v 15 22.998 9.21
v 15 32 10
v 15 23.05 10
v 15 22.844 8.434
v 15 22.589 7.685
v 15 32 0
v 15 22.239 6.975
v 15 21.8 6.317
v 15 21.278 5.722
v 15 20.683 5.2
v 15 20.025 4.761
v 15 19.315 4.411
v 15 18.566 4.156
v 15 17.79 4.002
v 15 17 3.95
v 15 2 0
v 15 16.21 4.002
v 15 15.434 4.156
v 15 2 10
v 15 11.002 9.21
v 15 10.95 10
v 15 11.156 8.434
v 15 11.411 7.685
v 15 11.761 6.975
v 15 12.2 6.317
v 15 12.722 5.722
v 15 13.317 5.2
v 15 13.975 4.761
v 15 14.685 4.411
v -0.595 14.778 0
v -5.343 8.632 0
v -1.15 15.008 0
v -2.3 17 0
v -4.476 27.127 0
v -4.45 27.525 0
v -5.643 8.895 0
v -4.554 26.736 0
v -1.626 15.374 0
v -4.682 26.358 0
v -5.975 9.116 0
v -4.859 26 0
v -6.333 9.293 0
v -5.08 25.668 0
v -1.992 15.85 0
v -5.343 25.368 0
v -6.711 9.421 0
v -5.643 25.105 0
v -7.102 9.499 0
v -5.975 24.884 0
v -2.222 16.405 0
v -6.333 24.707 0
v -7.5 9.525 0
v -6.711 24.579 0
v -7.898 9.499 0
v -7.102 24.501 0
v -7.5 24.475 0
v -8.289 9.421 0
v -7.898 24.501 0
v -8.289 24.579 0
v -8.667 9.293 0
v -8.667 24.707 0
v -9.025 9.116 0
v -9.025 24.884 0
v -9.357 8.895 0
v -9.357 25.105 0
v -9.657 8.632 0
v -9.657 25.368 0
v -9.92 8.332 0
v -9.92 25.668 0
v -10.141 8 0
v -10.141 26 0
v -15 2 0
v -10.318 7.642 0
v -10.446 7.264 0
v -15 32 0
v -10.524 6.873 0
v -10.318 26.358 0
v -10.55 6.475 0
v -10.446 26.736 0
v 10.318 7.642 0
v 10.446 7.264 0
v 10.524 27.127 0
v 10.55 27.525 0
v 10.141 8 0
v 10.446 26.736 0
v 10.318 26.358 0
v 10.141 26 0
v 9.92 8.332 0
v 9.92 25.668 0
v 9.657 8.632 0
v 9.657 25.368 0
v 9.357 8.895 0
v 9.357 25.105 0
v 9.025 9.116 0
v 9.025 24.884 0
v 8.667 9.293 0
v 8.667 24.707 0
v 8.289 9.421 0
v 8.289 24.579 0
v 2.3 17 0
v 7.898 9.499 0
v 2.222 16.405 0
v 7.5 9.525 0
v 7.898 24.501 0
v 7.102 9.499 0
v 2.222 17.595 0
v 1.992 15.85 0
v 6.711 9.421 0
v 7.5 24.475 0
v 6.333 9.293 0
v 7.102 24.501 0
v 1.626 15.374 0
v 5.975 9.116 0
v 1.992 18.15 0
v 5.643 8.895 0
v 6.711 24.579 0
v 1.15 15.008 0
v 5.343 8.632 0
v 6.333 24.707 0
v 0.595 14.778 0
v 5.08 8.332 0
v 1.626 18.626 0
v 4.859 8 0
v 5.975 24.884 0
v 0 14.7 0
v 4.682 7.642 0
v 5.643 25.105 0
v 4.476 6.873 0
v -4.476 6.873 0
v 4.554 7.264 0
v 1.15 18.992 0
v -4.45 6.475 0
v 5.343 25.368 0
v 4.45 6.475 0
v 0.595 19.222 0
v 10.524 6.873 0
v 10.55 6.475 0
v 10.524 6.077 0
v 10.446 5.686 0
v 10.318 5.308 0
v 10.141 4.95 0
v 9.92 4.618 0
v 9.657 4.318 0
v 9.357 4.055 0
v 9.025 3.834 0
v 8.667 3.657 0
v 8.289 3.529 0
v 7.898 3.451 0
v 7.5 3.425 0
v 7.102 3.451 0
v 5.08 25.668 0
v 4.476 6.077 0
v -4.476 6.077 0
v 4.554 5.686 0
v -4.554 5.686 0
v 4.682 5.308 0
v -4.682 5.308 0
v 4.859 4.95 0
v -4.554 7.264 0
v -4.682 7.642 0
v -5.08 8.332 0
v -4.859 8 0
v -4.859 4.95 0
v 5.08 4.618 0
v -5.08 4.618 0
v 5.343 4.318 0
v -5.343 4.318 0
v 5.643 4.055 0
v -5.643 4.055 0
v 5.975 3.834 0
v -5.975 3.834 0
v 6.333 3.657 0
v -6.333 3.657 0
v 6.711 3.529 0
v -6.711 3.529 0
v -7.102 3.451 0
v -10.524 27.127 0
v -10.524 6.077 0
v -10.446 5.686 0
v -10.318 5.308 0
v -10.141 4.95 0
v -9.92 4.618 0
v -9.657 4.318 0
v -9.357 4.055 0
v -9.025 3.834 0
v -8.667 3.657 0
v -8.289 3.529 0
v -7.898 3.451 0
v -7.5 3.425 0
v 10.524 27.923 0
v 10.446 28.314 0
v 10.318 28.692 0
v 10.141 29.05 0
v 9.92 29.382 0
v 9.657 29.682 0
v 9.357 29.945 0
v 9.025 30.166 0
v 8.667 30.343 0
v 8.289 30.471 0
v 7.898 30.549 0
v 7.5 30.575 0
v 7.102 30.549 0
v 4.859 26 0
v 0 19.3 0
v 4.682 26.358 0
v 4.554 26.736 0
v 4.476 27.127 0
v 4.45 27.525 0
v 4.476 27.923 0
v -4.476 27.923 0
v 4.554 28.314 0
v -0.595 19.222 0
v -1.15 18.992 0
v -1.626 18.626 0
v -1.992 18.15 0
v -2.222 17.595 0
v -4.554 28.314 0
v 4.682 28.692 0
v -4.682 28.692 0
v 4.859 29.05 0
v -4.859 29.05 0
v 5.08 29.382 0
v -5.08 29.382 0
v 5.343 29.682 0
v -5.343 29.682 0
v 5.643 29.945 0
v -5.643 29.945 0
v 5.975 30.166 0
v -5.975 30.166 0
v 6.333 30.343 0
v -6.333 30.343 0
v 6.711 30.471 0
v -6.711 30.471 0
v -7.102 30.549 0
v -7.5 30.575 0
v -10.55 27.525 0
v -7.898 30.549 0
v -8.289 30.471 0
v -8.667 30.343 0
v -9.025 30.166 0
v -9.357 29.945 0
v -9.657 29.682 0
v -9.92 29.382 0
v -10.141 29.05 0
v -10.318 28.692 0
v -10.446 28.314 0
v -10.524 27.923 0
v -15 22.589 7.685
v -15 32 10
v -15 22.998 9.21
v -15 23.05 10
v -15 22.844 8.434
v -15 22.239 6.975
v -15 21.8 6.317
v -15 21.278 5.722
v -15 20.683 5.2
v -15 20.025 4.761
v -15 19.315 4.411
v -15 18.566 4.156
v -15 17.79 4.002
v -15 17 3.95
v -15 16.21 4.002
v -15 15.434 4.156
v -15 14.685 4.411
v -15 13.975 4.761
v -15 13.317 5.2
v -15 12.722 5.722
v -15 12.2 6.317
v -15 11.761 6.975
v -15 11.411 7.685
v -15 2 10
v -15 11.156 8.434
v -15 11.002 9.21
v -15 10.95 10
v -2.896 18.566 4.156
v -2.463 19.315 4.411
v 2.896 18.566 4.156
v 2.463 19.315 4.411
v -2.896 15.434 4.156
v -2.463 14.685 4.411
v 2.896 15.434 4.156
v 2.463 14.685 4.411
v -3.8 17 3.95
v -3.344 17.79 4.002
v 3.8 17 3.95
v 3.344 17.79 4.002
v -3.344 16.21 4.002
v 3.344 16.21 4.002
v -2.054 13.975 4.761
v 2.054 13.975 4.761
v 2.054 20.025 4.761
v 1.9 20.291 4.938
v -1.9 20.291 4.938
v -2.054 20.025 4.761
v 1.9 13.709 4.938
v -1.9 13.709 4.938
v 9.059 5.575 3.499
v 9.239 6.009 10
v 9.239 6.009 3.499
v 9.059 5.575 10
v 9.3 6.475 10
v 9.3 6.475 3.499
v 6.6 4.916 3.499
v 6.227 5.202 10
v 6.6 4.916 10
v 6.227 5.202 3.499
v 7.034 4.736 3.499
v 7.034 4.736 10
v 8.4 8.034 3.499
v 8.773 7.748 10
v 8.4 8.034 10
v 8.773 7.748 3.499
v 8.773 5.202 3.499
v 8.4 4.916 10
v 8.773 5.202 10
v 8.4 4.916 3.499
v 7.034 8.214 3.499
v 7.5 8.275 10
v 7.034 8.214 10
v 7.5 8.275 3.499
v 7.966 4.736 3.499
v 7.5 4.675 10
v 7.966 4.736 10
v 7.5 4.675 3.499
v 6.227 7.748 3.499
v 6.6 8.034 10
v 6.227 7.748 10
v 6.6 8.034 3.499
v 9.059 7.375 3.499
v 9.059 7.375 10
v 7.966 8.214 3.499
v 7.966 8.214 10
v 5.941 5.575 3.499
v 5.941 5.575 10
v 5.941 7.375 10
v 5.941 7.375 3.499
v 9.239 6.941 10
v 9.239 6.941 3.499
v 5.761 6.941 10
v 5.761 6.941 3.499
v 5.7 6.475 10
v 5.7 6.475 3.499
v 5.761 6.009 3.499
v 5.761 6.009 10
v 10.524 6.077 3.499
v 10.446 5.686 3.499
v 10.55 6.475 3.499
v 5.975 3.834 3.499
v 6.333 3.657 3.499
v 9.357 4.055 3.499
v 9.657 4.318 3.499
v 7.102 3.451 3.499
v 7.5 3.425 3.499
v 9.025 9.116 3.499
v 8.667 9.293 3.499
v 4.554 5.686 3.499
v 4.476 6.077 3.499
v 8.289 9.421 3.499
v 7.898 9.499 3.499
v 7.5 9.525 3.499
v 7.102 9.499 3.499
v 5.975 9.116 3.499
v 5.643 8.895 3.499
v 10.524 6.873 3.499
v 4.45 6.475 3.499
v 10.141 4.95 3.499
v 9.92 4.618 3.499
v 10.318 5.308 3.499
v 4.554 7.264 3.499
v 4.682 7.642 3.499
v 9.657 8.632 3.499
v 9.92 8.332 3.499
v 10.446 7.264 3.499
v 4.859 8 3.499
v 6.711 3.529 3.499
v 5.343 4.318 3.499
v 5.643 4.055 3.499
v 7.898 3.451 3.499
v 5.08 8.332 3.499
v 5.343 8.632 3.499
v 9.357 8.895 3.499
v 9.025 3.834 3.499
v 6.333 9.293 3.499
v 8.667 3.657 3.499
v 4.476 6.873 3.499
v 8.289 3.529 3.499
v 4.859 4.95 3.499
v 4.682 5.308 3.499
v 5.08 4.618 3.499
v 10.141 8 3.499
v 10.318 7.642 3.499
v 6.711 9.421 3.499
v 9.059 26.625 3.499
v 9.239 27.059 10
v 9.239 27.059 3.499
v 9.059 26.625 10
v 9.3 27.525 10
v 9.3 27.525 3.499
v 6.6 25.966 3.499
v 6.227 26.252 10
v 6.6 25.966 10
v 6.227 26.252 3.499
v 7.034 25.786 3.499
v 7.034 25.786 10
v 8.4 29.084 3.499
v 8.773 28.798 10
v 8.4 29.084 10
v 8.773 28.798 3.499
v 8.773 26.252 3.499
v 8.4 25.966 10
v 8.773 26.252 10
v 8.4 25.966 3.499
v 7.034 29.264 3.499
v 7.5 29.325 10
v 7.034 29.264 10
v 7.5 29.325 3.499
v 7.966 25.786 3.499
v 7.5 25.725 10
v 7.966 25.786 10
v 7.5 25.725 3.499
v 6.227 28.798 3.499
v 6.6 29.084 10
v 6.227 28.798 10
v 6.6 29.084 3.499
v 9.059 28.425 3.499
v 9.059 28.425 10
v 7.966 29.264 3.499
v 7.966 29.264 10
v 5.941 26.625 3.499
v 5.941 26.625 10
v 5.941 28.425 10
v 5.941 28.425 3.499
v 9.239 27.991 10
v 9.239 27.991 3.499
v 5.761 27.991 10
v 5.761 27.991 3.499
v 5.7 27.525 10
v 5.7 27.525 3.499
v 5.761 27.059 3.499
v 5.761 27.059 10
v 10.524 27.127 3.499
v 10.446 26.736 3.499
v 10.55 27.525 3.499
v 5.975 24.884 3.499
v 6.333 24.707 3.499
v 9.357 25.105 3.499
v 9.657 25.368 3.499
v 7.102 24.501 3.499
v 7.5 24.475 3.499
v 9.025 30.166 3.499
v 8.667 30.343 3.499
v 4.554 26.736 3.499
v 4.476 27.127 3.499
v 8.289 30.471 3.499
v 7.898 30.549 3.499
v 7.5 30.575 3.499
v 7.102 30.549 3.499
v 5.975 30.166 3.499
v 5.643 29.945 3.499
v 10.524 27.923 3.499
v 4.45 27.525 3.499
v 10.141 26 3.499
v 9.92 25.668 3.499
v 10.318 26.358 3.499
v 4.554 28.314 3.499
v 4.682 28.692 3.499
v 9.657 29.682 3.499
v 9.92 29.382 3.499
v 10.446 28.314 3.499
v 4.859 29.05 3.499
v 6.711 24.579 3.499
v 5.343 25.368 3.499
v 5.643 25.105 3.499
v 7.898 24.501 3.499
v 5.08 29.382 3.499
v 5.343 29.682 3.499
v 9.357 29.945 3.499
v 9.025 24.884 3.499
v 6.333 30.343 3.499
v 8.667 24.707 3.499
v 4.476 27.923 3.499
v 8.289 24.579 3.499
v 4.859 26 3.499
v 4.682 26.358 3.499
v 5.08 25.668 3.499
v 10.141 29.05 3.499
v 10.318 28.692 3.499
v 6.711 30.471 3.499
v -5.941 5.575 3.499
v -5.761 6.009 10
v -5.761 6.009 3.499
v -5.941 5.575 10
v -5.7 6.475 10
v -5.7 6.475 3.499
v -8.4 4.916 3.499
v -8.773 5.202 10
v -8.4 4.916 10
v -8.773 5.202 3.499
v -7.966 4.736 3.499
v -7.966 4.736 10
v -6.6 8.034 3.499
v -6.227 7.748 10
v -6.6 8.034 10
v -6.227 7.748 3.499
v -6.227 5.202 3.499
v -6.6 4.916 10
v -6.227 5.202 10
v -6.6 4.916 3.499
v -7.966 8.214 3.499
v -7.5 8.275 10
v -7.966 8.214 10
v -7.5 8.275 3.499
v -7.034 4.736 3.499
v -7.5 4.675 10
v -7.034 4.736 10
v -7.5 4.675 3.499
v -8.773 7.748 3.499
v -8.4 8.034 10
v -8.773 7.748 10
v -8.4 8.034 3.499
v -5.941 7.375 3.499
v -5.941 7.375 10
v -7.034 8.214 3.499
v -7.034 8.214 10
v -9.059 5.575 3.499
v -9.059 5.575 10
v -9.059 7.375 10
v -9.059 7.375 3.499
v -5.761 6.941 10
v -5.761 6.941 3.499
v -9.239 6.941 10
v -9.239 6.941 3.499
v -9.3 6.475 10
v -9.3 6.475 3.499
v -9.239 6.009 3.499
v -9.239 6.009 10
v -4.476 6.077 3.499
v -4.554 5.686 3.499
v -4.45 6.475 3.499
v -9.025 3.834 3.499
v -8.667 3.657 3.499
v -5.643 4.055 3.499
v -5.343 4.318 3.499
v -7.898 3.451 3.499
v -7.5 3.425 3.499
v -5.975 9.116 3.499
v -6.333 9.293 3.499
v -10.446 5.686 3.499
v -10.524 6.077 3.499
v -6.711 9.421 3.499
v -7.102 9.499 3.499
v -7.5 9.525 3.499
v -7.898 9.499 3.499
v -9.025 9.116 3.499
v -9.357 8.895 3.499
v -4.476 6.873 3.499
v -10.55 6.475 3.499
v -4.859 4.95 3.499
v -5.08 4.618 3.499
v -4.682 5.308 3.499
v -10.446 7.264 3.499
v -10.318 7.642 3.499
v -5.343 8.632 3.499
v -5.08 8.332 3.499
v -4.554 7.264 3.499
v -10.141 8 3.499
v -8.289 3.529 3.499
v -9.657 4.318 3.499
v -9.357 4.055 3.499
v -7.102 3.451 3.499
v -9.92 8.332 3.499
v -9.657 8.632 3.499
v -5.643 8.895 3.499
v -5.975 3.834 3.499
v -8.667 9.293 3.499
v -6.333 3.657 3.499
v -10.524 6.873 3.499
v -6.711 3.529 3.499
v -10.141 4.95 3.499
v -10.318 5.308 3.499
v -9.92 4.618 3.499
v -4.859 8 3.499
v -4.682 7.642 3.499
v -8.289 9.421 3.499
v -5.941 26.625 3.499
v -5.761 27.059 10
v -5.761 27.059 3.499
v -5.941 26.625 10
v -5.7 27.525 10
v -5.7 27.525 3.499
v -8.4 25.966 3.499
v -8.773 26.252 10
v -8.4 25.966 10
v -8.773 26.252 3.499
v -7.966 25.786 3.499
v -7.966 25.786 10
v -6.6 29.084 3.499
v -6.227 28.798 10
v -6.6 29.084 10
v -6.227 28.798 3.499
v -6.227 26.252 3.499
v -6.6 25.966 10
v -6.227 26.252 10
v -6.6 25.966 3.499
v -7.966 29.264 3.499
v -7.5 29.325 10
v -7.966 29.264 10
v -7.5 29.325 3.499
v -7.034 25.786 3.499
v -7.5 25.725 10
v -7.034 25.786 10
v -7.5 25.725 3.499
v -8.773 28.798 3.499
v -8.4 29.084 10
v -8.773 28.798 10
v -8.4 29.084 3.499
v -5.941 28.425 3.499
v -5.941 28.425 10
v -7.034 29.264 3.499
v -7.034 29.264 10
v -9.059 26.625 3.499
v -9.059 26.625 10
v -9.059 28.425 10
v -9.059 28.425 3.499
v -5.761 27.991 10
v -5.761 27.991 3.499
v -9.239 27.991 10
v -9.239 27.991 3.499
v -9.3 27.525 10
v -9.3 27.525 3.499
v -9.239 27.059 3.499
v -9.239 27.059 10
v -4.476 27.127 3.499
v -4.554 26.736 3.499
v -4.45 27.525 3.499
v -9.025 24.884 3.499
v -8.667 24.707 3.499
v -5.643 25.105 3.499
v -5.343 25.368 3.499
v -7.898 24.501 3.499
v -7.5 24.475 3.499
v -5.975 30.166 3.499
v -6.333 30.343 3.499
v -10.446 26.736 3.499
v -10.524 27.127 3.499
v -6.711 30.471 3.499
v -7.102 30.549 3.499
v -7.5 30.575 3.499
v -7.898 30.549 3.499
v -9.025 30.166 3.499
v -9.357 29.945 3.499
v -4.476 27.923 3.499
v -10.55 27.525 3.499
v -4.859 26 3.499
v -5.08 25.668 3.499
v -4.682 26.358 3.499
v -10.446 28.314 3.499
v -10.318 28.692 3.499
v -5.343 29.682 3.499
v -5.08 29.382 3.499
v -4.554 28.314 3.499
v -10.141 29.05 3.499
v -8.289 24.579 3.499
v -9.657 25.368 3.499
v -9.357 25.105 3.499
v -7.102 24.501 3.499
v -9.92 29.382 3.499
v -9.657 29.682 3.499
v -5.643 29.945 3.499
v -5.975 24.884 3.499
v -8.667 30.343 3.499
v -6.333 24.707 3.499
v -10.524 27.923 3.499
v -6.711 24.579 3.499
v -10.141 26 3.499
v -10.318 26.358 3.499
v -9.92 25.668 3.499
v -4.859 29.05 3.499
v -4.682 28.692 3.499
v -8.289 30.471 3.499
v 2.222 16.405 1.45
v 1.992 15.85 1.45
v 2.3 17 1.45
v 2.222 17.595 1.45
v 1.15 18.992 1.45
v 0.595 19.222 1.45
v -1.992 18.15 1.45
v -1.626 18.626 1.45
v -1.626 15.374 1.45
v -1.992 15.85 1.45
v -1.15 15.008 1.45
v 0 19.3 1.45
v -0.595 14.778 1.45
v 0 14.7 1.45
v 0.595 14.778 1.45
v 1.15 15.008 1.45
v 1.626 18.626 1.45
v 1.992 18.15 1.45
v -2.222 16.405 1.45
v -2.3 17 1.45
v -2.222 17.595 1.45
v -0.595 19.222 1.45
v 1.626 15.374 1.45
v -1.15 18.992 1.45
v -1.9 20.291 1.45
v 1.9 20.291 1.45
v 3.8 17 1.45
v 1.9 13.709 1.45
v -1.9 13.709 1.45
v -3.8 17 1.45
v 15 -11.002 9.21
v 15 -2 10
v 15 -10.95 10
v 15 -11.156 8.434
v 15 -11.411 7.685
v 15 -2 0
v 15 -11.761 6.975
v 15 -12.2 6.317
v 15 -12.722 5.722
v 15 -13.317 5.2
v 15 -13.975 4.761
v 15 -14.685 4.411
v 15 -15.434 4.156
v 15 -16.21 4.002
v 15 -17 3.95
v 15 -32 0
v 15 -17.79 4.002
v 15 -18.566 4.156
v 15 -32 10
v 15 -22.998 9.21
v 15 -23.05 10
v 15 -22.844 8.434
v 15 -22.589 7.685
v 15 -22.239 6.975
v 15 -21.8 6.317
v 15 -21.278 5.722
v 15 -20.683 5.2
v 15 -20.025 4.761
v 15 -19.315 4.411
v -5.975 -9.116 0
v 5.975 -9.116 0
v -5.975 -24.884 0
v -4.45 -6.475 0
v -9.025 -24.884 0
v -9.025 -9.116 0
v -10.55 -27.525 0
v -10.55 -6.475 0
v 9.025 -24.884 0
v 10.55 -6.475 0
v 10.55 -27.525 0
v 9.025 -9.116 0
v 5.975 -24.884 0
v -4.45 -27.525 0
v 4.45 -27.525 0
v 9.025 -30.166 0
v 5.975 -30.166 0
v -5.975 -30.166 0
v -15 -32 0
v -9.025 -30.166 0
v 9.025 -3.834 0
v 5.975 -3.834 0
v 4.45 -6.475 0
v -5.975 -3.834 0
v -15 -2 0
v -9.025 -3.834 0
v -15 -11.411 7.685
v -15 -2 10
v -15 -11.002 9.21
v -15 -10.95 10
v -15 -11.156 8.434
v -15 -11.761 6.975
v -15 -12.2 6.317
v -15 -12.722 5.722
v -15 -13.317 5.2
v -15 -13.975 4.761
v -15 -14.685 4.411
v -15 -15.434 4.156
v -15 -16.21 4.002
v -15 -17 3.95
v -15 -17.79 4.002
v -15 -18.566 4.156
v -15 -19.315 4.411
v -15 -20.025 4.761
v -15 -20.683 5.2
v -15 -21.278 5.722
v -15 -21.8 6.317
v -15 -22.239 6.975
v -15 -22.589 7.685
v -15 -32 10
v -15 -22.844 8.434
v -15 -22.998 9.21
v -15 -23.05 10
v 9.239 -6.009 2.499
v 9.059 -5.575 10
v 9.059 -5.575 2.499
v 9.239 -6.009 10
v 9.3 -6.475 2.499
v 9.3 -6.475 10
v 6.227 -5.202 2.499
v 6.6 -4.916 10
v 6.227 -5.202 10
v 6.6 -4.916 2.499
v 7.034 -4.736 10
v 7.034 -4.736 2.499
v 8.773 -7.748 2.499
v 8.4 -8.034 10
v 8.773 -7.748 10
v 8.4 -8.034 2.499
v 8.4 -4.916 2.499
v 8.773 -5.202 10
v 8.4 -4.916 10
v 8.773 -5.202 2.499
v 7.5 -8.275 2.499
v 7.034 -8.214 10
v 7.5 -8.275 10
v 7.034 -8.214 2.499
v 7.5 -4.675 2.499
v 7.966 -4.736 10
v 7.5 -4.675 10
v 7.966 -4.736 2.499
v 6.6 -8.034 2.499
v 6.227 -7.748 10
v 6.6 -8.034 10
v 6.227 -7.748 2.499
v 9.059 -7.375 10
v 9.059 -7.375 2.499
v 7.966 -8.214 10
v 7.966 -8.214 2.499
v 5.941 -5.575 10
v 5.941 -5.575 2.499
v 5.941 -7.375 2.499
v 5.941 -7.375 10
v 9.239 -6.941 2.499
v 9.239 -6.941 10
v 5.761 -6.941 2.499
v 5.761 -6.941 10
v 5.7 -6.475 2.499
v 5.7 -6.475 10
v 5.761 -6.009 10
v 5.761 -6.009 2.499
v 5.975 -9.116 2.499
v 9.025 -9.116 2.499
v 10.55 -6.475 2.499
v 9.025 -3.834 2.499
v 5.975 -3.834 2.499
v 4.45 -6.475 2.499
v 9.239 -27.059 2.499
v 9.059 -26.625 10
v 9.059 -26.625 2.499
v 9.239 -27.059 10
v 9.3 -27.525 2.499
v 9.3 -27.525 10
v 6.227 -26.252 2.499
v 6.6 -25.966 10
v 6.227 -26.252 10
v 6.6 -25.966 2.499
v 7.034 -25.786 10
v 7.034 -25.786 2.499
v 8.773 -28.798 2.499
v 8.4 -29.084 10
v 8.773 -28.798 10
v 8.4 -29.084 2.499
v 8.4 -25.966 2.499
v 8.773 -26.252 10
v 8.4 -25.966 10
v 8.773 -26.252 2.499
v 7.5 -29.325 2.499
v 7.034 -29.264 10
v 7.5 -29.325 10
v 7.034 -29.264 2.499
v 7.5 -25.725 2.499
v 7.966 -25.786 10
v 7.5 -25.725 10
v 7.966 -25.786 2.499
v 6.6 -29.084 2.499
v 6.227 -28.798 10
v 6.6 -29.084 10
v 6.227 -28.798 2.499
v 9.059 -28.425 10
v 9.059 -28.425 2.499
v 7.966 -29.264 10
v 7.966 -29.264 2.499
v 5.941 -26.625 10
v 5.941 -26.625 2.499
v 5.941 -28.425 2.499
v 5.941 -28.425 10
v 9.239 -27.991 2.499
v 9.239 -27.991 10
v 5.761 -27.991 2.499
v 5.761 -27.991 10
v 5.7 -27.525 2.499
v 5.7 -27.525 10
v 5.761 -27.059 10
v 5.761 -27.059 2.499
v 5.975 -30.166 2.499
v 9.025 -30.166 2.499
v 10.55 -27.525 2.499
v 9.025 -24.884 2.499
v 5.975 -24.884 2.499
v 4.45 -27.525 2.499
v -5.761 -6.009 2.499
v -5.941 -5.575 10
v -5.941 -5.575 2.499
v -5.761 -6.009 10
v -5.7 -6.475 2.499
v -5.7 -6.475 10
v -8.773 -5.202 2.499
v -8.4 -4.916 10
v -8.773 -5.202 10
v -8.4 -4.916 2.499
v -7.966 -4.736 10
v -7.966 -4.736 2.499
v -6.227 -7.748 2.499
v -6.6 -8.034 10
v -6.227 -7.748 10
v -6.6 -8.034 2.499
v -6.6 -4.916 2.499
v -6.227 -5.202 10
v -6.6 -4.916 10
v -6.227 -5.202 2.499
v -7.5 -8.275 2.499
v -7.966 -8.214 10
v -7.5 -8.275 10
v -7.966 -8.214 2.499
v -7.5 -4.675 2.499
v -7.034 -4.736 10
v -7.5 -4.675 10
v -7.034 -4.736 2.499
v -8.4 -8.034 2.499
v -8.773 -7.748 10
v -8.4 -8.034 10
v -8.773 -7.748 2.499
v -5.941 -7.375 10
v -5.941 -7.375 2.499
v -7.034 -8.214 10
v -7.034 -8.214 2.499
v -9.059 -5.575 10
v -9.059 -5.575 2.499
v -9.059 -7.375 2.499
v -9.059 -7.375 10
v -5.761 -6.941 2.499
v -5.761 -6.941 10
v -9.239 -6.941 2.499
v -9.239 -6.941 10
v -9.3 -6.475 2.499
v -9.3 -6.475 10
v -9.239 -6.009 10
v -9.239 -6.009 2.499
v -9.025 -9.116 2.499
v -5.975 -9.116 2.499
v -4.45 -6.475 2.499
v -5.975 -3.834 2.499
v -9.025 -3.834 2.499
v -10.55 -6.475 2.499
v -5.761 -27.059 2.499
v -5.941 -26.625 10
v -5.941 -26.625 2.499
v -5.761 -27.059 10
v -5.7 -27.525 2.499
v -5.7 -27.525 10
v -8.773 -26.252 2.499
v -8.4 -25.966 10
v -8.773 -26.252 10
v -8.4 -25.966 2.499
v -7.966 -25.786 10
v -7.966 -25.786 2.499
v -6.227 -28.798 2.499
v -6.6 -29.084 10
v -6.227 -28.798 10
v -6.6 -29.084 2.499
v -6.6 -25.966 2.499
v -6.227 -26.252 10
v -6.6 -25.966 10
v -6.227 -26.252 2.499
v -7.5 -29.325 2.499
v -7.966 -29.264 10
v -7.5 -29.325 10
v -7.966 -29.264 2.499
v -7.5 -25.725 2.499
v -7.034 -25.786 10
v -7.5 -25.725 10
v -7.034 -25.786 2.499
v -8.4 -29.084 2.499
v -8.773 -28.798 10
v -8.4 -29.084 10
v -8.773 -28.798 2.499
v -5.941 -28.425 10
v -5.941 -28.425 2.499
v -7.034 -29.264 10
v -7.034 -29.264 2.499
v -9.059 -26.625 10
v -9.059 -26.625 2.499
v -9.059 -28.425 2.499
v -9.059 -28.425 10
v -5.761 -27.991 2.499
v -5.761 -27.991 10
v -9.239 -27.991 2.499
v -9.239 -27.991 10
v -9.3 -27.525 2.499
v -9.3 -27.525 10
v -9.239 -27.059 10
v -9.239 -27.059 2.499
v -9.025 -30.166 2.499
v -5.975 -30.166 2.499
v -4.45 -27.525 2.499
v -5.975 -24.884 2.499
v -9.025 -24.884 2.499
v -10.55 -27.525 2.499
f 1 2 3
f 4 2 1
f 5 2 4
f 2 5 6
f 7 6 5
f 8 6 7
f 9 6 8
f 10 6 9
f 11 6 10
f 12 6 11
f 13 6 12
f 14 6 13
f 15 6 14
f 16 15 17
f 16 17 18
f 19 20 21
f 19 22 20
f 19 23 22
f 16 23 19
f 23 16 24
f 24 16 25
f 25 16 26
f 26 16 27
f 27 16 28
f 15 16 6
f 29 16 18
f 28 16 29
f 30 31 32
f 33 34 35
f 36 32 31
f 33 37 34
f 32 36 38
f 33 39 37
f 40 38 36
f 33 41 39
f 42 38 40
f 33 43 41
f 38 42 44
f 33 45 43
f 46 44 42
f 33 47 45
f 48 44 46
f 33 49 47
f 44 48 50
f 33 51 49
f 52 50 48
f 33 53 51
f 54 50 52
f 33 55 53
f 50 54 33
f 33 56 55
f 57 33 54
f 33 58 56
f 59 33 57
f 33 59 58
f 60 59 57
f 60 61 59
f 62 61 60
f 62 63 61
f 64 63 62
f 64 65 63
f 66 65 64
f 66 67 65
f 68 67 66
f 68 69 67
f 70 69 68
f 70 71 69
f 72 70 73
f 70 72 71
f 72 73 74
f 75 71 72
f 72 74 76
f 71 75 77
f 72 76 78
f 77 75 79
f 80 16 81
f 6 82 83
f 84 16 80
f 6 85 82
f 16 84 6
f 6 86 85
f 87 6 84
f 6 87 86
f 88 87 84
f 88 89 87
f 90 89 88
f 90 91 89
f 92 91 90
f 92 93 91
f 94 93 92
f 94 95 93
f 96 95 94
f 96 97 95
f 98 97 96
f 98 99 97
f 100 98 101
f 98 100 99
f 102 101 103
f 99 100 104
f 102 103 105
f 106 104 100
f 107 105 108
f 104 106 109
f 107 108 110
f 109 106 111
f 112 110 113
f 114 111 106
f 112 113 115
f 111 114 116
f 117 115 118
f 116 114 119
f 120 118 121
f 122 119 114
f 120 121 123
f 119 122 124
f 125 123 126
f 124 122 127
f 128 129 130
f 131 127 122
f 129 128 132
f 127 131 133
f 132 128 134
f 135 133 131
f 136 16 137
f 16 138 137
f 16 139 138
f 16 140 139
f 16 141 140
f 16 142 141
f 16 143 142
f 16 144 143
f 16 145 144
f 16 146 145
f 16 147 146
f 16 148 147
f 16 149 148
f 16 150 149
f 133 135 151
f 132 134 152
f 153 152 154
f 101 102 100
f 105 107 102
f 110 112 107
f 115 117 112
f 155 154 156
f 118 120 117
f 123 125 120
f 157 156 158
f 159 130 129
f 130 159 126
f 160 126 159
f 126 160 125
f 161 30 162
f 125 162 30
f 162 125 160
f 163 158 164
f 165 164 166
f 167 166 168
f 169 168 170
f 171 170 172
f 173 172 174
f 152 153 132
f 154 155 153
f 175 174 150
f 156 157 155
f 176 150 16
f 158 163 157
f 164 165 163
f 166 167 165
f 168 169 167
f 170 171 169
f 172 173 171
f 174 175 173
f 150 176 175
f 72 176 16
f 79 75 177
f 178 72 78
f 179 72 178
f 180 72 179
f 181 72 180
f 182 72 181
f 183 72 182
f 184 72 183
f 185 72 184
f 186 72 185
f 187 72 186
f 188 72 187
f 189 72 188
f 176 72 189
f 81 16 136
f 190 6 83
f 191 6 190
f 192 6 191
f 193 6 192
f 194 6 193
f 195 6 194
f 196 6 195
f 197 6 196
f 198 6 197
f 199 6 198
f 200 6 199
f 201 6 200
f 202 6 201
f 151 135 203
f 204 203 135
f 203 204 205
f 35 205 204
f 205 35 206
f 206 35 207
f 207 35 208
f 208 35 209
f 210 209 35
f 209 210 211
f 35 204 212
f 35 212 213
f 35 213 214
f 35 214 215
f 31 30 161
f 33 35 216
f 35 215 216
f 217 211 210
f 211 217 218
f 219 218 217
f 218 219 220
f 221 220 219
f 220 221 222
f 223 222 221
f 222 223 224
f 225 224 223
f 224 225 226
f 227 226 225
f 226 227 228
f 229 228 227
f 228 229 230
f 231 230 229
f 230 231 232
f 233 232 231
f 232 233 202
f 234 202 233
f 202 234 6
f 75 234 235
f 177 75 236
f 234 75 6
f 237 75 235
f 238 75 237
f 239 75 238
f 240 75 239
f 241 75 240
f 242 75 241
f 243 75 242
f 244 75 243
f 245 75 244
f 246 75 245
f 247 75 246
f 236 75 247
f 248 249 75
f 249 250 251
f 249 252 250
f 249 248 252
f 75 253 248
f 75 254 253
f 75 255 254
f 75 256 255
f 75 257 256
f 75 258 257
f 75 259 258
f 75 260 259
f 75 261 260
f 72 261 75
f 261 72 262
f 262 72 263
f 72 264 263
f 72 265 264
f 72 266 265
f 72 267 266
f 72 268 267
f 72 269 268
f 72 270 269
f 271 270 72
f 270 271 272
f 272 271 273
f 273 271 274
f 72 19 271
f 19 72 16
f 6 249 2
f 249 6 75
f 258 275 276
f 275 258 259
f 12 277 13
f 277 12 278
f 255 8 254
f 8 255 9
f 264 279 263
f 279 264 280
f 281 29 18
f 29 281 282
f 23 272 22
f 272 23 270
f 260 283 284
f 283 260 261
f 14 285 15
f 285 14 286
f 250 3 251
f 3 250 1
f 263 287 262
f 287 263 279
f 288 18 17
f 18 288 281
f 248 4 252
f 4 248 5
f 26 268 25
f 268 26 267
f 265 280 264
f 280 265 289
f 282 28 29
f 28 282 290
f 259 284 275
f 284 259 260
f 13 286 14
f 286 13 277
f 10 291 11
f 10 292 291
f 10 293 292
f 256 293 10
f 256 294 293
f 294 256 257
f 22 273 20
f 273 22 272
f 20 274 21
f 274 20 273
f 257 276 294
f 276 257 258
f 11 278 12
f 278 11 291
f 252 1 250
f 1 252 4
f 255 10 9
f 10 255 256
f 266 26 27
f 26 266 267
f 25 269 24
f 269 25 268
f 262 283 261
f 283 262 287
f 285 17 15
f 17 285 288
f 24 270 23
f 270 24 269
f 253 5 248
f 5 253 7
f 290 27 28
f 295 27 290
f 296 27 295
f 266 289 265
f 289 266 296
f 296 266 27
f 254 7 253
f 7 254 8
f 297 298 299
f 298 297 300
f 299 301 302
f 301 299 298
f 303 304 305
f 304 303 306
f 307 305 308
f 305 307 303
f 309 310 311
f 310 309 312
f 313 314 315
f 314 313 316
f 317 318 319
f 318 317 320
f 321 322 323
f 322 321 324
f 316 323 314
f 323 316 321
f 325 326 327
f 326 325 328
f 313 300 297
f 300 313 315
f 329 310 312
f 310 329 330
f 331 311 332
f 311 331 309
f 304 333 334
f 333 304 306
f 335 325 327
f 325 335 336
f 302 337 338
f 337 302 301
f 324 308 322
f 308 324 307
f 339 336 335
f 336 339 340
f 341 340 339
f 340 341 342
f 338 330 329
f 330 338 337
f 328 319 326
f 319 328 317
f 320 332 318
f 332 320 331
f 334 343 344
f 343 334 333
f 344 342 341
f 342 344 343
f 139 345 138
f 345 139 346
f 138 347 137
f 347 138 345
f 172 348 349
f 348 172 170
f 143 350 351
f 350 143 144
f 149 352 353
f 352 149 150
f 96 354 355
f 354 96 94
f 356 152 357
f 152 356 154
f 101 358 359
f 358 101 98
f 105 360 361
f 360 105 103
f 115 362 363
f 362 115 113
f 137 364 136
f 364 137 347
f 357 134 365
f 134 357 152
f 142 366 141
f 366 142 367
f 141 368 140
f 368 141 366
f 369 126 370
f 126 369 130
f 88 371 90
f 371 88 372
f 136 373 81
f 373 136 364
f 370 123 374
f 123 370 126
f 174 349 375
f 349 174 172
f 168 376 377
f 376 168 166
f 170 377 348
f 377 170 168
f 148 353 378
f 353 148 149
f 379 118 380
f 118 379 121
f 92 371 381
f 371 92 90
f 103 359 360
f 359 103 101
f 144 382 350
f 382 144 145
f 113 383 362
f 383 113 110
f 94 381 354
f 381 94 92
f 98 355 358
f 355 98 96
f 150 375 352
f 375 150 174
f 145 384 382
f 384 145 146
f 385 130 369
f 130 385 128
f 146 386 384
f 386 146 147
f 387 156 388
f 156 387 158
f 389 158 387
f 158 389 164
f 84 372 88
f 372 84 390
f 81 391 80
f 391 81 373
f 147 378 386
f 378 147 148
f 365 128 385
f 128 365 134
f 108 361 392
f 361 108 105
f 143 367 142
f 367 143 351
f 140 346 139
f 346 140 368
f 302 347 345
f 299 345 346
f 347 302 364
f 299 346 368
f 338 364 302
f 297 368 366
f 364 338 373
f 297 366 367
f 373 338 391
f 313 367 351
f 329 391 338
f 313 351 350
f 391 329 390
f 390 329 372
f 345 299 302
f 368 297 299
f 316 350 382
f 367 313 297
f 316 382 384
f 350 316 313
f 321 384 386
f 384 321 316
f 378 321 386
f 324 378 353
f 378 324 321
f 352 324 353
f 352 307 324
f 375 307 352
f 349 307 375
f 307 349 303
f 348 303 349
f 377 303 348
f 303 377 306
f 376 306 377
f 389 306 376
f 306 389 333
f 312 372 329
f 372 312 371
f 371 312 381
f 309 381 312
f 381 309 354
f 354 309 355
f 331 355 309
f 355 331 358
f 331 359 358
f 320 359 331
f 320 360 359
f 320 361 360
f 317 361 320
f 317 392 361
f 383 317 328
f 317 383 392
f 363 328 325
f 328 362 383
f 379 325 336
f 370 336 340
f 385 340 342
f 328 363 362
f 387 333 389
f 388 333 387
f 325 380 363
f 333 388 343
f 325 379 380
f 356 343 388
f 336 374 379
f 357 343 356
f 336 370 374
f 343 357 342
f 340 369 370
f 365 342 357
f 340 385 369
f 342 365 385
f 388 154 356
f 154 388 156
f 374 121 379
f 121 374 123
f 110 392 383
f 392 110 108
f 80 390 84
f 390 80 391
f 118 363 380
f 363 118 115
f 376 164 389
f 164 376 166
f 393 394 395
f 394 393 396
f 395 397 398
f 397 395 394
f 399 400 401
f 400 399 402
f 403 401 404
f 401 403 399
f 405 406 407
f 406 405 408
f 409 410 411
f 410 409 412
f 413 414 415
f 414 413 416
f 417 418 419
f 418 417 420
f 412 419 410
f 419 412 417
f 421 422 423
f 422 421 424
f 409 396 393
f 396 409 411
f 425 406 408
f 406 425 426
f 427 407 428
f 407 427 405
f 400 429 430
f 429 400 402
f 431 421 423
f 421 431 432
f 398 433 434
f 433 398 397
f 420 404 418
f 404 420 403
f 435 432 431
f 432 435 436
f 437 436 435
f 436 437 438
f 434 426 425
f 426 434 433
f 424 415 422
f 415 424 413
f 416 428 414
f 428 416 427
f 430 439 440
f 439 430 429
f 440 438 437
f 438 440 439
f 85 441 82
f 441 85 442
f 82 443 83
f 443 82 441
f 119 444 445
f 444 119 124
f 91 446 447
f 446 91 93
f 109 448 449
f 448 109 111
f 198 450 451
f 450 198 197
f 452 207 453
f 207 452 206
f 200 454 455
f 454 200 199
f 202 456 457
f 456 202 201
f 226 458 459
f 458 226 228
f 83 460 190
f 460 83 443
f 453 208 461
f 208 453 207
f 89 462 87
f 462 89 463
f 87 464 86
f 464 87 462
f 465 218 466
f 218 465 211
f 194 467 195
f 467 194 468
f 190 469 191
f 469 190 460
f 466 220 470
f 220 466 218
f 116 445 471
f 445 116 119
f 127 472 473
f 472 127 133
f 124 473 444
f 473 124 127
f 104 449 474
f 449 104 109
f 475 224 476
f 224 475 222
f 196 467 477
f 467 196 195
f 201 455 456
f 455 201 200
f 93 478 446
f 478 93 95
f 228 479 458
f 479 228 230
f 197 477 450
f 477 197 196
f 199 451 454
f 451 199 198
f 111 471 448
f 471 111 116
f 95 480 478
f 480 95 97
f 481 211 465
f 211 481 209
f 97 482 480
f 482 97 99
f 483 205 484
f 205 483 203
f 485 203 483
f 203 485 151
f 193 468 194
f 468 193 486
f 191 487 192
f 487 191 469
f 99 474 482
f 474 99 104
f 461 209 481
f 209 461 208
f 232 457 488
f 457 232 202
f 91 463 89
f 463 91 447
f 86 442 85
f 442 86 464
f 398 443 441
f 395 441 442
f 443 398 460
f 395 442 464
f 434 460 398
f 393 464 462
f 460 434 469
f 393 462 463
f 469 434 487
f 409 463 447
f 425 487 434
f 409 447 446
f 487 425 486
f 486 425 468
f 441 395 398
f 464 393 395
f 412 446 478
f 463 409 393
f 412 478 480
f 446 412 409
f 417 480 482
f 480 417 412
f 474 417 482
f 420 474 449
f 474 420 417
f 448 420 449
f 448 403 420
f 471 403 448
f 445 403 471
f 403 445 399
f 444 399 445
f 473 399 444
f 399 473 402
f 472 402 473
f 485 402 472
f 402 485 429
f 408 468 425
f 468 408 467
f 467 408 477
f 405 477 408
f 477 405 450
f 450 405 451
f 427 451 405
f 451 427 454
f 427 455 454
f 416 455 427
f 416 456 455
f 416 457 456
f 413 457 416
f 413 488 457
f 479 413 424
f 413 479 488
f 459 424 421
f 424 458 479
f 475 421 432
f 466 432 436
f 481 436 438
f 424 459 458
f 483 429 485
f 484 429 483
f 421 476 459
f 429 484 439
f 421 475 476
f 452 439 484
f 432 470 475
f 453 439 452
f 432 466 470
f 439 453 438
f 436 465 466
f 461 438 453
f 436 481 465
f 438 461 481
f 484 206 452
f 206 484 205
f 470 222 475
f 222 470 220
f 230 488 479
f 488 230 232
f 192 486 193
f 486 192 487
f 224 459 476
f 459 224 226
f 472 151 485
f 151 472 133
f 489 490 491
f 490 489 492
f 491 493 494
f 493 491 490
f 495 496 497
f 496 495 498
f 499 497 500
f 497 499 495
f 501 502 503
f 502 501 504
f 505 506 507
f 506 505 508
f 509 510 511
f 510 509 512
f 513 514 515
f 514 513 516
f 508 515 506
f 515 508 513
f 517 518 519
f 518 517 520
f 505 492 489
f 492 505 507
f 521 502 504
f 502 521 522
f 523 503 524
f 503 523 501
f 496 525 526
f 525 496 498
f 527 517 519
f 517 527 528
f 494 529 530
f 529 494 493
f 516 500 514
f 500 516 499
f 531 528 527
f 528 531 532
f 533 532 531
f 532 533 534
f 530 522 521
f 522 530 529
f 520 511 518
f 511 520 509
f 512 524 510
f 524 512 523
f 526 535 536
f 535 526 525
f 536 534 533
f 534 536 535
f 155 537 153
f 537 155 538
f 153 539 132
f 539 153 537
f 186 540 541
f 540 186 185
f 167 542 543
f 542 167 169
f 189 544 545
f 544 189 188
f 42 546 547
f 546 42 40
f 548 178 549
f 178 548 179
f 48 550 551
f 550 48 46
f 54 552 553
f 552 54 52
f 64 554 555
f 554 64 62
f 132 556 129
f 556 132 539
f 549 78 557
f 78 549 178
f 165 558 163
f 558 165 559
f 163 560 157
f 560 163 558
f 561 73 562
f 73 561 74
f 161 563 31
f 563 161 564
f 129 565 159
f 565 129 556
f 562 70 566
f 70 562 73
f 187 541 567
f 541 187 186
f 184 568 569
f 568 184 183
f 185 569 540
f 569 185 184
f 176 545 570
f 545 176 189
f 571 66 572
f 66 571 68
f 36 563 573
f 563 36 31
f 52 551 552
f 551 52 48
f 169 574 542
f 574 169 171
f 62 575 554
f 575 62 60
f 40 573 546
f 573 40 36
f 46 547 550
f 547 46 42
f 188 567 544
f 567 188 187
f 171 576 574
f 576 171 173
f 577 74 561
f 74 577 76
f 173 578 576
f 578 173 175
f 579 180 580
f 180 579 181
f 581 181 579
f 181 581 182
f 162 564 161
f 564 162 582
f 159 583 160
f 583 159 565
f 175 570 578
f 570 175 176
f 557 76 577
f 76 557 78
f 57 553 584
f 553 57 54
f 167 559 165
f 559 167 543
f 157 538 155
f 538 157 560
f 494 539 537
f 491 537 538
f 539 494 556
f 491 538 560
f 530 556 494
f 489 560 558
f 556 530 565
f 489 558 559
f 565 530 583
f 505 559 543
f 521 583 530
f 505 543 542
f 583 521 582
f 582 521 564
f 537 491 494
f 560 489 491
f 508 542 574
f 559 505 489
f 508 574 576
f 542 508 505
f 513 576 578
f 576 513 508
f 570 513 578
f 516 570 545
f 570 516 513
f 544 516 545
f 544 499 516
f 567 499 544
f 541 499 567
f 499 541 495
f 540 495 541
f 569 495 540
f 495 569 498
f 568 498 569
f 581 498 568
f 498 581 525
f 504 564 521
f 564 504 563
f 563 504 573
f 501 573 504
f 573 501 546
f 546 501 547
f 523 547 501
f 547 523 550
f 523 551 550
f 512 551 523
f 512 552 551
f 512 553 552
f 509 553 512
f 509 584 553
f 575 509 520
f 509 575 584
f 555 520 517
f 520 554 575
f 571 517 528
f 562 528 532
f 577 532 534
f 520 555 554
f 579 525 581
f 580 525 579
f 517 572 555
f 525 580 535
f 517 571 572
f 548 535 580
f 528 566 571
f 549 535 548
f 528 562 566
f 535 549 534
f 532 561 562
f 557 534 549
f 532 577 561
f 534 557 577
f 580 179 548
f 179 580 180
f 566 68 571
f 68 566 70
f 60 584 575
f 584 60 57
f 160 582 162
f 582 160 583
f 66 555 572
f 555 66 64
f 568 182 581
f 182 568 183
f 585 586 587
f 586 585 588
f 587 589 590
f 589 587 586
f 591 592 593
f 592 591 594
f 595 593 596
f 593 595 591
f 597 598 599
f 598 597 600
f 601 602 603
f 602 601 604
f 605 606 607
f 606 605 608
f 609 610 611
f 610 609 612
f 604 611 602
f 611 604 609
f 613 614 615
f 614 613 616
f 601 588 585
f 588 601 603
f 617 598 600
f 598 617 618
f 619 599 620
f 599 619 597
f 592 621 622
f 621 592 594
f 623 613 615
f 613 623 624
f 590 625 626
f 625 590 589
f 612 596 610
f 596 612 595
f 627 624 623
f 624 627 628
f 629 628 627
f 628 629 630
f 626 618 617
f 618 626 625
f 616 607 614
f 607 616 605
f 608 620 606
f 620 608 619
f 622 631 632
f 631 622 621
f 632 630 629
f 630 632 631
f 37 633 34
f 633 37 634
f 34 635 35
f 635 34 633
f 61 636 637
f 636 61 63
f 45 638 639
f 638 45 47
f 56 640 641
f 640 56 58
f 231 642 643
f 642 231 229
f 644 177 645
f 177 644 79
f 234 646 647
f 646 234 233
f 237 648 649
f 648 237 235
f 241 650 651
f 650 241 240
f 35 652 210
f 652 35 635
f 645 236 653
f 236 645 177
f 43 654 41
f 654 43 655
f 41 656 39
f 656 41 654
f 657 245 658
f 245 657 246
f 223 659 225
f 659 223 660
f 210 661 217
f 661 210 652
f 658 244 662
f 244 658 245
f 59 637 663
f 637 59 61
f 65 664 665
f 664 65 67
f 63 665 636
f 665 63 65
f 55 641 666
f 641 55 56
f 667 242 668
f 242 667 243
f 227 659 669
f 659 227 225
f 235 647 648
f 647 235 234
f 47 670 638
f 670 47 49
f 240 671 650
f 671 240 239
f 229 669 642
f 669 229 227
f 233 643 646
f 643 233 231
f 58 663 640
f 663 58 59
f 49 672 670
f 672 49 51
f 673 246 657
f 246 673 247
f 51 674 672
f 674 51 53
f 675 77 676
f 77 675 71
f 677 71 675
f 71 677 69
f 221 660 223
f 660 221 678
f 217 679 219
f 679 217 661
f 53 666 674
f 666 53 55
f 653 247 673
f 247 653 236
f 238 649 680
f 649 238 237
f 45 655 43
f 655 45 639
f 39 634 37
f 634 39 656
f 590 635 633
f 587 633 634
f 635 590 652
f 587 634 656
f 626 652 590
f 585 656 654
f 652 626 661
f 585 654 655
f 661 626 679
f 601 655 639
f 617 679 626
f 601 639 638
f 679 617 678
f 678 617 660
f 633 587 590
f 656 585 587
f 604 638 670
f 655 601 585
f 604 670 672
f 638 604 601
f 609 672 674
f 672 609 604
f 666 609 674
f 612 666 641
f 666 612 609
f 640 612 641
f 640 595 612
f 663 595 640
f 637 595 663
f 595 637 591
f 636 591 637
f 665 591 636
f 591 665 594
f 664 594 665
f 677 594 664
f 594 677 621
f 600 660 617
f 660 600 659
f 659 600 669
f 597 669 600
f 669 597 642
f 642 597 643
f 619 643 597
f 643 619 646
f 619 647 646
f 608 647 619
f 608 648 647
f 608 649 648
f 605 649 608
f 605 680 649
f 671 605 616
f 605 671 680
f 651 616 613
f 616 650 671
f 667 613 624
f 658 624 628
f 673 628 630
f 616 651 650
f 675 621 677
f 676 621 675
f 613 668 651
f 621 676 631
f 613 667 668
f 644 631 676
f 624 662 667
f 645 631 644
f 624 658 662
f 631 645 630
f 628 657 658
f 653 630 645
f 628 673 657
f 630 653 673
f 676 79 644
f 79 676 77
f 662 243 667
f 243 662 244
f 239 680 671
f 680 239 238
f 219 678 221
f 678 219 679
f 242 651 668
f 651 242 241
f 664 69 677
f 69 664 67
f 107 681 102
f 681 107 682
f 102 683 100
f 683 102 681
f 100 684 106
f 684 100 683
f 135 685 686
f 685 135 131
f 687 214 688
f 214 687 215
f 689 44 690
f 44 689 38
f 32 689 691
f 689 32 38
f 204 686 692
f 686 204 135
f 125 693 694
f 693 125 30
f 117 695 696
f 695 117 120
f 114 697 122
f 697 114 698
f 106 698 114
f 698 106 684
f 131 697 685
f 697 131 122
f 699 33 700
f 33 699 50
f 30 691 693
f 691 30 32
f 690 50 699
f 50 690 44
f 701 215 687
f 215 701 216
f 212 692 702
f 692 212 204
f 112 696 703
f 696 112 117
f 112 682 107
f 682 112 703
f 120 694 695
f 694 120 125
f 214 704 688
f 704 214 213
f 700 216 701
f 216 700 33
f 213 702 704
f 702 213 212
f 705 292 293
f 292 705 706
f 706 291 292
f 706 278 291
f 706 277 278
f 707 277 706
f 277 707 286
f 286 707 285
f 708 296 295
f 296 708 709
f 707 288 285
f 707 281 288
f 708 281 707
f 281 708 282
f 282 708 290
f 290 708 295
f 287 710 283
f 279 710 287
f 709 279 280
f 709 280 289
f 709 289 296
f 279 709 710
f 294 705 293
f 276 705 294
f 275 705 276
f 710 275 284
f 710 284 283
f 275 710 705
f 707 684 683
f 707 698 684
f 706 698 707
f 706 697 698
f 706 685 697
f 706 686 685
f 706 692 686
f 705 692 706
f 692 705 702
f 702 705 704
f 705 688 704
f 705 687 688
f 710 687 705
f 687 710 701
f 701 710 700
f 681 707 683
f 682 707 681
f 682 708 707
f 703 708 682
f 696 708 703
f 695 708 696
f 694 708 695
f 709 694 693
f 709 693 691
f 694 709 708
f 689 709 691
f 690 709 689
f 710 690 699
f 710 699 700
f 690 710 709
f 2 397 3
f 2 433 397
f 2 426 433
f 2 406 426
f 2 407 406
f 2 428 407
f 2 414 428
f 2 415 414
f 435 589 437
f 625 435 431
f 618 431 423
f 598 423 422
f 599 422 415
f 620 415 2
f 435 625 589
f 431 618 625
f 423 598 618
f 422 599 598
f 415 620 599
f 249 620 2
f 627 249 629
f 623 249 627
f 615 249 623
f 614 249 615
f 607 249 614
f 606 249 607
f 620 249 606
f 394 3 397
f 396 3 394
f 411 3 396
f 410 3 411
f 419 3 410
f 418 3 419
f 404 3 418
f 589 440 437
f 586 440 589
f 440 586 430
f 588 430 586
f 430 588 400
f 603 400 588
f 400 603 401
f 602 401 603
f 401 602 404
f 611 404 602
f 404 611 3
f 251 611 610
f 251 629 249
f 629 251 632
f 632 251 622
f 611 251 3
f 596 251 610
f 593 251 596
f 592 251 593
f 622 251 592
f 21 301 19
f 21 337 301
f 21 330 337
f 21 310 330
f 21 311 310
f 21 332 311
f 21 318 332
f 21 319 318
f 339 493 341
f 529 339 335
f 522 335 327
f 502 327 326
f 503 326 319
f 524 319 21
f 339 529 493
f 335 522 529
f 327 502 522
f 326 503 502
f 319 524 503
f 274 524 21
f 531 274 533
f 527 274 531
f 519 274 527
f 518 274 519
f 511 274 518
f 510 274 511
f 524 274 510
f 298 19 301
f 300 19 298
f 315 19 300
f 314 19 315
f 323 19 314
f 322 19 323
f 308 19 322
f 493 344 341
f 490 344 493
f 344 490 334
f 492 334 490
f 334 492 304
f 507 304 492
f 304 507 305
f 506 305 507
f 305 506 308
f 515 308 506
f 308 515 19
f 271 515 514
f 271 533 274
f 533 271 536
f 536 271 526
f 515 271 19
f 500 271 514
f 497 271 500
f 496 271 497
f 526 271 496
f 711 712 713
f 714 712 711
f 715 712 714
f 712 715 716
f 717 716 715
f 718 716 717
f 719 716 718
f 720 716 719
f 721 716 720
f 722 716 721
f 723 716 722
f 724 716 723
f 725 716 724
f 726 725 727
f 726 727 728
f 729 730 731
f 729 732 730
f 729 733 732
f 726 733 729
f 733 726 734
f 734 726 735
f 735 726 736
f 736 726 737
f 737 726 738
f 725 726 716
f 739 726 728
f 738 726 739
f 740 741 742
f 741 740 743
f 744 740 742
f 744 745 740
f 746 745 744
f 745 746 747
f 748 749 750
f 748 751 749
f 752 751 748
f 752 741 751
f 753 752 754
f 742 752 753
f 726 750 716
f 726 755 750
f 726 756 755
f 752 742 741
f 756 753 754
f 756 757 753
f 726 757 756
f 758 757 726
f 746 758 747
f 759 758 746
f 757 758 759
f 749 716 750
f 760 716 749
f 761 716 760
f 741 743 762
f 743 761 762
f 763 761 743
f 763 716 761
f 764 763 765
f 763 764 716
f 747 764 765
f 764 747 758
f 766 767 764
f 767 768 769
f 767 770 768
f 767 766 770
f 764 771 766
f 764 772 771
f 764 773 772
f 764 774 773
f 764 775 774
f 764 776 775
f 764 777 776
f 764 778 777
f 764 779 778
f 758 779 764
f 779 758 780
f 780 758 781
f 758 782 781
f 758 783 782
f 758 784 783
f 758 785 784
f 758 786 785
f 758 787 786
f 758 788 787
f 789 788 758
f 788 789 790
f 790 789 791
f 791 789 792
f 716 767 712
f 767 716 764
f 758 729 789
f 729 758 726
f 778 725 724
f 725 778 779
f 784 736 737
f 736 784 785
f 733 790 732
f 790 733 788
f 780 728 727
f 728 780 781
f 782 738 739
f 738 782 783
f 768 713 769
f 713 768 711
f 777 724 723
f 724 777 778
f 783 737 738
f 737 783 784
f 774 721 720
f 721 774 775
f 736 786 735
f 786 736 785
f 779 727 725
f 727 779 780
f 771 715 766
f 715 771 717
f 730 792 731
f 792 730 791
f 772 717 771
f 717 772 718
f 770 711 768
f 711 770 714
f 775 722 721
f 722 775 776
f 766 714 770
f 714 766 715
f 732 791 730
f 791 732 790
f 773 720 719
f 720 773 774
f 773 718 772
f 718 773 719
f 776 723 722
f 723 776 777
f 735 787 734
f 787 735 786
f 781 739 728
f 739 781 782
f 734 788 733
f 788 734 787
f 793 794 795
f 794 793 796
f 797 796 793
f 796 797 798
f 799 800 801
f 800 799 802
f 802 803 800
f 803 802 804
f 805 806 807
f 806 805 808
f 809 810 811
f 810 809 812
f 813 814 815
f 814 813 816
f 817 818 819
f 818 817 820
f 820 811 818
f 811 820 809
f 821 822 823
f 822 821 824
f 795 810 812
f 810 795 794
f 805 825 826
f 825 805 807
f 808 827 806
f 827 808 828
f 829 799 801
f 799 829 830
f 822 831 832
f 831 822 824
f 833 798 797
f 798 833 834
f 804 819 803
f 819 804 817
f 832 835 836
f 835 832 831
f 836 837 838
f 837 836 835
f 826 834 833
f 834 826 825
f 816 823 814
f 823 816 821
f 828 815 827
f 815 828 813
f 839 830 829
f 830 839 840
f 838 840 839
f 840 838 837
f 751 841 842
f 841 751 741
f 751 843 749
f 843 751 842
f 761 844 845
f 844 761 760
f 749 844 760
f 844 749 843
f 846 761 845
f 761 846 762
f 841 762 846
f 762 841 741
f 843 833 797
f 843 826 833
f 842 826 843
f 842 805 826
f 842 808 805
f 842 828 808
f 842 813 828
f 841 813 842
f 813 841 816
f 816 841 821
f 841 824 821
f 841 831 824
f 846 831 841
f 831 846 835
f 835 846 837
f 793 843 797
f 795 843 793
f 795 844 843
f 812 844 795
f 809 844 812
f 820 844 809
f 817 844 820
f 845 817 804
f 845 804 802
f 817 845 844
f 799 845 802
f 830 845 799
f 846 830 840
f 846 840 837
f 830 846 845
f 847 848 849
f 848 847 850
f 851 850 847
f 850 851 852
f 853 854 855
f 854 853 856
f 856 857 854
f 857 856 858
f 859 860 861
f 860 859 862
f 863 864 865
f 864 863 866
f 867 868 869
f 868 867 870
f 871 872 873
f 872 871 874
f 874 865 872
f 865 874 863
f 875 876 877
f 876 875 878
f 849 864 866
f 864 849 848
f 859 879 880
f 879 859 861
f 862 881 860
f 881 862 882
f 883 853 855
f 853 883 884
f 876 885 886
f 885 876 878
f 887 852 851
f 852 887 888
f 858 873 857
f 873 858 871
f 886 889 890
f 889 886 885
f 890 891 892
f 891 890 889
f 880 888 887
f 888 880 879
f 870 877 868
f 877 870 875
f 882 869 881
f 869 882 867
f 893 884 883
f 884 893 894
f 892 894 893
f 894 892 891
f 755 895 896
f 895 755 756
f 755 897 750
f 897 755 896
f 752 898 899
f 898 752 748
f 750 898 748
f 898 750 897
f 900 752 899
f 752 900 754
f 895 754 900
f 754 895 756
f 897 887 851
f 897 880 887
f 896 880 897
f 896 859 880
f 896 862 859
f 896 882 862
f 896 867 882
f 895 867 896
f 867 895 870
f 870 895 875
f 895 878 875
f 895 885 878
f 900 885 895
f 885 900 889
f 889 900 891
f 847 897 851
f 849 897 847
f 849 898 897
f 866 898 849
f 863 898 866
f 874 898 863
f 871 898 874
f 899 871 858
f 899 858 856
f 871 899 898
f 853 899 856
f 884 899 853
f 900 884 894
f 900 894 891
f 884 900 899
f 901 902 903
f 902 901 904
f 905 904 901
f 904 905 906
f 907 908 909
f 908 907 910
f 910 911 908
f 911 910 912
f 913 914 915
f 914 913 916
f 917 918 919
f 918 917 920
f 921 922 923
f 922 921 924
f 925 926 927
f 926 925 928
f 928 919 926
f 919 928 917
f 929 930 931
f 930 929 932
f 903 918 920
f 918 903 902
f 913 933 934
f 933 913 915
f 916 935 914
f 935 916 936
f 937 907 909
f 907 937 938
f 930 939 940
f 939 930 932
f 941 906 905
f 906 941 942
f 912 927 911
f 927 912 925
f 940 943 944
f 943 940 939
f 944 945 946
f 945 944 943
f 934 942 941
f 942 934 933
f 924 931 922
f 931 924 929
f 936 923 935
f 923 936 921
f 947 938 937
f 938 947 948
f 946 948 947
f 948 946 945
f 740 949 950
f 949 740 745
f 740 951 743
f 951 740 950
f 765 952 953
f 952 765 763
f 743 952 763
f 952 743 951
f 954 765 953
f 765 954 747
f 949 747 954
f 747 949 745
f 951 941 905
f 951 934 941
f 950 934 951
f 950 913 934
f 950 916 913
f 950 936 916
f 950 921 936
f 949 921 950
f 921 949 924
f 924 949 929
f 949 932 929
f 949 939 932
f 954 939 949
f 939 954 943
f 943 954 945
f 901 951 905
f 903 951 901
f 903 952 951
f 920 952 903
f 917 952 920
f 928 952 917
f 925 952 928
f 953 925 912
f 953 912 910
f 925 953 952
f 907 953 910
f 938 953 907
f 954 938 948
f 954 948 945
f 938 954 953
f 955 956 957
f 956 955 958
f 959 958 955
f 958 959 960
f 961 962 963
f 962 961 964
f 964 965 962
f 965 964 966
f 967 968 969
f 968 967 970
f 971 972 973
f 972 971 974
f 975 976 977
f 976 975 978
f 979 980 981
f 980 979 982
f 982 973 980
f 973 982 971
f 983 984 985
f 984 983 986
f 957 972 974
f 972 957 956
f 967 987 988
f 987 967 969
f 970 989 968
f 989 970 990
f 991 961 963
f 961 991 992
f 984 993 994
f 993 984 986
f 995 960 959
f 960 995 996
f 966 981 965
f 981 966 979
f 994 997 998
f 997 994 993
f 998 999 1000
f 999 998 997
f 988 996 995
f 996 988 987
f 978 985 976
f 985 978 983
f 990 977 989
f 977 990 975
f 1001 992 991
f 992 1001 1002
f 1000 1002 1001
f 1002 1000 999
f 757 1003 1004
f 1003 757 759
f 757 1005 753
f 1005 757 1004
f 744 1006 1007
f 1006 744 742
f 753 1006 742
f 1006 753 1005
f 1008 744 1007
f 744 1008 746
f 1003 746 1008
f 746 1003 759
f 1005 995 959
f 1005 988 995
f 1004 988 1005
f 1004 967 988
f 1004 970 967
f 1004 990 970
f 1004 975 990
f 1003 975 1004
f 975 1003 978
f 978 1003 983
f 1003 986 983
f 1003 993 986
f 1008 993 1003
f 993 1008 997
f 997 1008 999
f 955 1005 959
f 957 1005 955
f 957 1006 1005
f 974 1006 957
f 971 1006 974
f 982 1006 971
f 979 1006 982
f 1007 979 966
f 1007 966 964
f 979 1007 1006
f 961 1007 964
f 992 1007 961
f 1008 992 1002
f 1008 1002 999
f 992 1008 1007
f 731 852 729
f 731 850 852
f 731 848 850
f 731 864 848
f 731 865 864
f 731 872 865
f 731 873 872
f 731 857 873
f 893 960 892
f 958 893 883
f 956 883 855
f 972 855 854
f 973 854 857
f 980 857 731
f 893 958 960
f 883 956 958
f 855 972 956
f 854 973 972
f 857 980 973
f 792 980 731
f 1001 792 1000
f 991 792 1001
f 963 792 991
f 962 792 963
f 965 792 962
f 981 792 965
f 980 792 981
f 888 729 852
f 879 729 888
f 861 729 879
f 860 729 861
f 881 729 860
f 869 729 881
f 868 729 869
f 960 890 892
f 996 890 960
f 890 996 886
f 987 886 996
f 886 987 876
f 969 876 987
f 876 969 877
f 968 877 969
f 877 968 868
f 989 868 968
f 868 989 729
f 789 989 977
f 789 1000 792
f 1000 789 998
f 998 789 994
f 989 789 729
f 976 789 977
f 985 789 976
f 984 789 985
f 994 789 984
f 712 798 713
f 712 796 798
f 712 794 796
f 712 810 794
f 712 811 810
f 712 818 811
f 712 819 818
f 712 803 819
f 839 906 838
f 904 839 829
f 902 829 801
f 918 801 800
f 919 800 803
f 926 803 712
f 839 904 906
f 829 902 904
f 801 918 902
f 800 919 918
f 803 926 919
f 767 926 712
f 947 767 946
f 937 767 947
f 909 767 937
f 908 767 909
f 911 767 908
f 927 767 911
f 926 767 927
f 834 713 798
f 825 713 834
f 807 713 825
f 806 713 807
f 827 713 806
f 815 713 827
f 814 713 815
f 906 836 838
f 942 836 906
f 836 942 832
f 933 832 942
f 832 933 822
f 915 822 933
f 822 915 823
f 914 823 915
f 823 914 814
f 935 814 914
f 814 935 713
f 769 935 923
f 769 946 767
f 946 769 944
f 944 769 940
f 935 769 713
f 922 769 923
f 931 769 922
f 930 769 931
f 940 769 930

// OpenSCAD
// Music stand clamp

// Copyright (C) 2015 Jeremy Bennett <jeremy@jeremybennett.com>

// Contributor: Jeremy Bennett <jeremy@jeremybennett.com>

// This file is licensed under the Creative Commons Attribution-ShareAlike 3.0
// Unported License. To view a copy of this license, visit
// http://creativecommons.org/licenses/by-sa/3.0/ or send a letter to Creative
// Commons, PO Box 1866, Mountain View, CA 94042, USA.

// 45678901234567890123456789012345678901234567890123456789012345678901234567890


// This clamp was designed to stop my music stand legs splaying around after
// its original locking screw stripped its thread.  But it would work for any
// situation where you need a lockable clamp on a bar.

// It is designed for any situation where you cannot slip the clamp over the
// end of the bar, so the clamp must be in two halves.

// In the main design, the hole for the main bar is horizontal, so all the
// other holes etc are vertical, thereby reducing the number of cylinders
// needing rotating.  The final parts are rotated for ease of printing.


// Small amount to ensure overaps when needed
EPS = 0.001;

// Amount around shanks, heads etc, to allow for printer overflow
GAP = 0.3;

// Standard constants
M3_SHANK_R = 3.0 / 2 + GAP;
M3_HEAD_R   = 5.5 / 2 + GAP;
M4_SHANK_R = 4.0 / 2 + GAP;
M4_HEAD_R   = 7.0 / 2 + GAP;
M5_SHANK_R = 5.0 / 2 + GAP;
M5_HEAD_R   = 8.0 / 2 + GAP;

// Constants defining the design
SHANK_R = M3_SHANK_R;                 // Main construction bolts
HEAD_R   = M3_HEAD_R;
HEAD_H   = 3.5;
NUT_H    = 2.5;
LENGTH   = 20.0;

WING_SHANK_R = M4_SHANK_R;            // Wing bolt for locking
WING_HEAD_R   = M4_HEAD_R;

LENGTH  = 30.0;                       // Block dimensions
BREADTH = 30.0;
DEPTH   = 20.0;

BAR_R = 10.9 / 2 + GAP * 2;           // The main bar being clamped


// The basic block with a horizontal hole in it
module block () {
    difference () {
        cube (size = [LENGTH, BREADTH, DEPTH], center = true);
        rotate (a = [0, 90, 0])
            cylinder (r = BAR_R, h = LENGTH * 2, center = true, $fn = 48);
    }
}


// A bolt hole, with space for the head
module bolt_hole () {
    union () {
        cylinder (r = SHANK_R, h = DEPTH + EPS, center = true, $fn = 24);
        translate (v = [0, 0, (DEPTH - HEAD_H) / 2 + EPS])
            cylinder (r = HEAD_R, h = HEAD_H, center = true, $fn = 48);
        translate (v = [0, 0, - (DEPTH - NUT_H) / 2 - EPS])
            cylinder (r = HEAD_R, h = NUT_H, center = true, $fn = 6);
    }
}

// Set of bolts
module bolts () {
    b_off = (BREADTH + 2 * BAR_R) / 4;
    l_off = LENGTH / 4;
    translate (v = [ l_off,  b_off , 0])
        bolt_hole ();
    translate (v = [ l_off, -b_off , 0])
        bolt_hole ();
    translate (v = [-l_off,  b_off , 0])
        bolt_hole ();
    translate (v = [-l_off, -b_off , 0])
        bolt_hole ();
}


// Wing nut and bolt tighener
module wing () {
    union () {
        cylinder (r = WING_SHANK_R, h = DEPTH, center = false, $fn = 24);
        cylinder (r = WING_HEAD_R, h = NUT_H + BAR_R, center = false, $fn = 6);
    }
}


// The clamp proper
module clamp () {
    difference () {
        block ();
        bolts ();
        wing ();
    }
}


// Top half of clamp
module clamp_top () {
    intersection () {
        clamp ();
        translate (v = [0, 0, DEPTH])
            cube (size = [LENGTH * 2, BREADTH * 2, DEPTH *2], center = true);
    }
}


// Bottom half of clamp
module clamp_bottom () {
    intersection () {
        clamp ();
        translate (v = [0, 0, -DEPTH])
             cube (size = [LENGTH * 2, BREADTH * 2, DEPTH *2], center = true);
    }
}


// Invert for printing
translate (v = [0, BREADTH / 2 + 2, DEPTH / 2])
     rotate (a = [180, 0, 0])
          clamp_top ();

translate (v = [0, -BREADTH / 2 - 2, DEPTH / 2])
     clamp_bottom ();
